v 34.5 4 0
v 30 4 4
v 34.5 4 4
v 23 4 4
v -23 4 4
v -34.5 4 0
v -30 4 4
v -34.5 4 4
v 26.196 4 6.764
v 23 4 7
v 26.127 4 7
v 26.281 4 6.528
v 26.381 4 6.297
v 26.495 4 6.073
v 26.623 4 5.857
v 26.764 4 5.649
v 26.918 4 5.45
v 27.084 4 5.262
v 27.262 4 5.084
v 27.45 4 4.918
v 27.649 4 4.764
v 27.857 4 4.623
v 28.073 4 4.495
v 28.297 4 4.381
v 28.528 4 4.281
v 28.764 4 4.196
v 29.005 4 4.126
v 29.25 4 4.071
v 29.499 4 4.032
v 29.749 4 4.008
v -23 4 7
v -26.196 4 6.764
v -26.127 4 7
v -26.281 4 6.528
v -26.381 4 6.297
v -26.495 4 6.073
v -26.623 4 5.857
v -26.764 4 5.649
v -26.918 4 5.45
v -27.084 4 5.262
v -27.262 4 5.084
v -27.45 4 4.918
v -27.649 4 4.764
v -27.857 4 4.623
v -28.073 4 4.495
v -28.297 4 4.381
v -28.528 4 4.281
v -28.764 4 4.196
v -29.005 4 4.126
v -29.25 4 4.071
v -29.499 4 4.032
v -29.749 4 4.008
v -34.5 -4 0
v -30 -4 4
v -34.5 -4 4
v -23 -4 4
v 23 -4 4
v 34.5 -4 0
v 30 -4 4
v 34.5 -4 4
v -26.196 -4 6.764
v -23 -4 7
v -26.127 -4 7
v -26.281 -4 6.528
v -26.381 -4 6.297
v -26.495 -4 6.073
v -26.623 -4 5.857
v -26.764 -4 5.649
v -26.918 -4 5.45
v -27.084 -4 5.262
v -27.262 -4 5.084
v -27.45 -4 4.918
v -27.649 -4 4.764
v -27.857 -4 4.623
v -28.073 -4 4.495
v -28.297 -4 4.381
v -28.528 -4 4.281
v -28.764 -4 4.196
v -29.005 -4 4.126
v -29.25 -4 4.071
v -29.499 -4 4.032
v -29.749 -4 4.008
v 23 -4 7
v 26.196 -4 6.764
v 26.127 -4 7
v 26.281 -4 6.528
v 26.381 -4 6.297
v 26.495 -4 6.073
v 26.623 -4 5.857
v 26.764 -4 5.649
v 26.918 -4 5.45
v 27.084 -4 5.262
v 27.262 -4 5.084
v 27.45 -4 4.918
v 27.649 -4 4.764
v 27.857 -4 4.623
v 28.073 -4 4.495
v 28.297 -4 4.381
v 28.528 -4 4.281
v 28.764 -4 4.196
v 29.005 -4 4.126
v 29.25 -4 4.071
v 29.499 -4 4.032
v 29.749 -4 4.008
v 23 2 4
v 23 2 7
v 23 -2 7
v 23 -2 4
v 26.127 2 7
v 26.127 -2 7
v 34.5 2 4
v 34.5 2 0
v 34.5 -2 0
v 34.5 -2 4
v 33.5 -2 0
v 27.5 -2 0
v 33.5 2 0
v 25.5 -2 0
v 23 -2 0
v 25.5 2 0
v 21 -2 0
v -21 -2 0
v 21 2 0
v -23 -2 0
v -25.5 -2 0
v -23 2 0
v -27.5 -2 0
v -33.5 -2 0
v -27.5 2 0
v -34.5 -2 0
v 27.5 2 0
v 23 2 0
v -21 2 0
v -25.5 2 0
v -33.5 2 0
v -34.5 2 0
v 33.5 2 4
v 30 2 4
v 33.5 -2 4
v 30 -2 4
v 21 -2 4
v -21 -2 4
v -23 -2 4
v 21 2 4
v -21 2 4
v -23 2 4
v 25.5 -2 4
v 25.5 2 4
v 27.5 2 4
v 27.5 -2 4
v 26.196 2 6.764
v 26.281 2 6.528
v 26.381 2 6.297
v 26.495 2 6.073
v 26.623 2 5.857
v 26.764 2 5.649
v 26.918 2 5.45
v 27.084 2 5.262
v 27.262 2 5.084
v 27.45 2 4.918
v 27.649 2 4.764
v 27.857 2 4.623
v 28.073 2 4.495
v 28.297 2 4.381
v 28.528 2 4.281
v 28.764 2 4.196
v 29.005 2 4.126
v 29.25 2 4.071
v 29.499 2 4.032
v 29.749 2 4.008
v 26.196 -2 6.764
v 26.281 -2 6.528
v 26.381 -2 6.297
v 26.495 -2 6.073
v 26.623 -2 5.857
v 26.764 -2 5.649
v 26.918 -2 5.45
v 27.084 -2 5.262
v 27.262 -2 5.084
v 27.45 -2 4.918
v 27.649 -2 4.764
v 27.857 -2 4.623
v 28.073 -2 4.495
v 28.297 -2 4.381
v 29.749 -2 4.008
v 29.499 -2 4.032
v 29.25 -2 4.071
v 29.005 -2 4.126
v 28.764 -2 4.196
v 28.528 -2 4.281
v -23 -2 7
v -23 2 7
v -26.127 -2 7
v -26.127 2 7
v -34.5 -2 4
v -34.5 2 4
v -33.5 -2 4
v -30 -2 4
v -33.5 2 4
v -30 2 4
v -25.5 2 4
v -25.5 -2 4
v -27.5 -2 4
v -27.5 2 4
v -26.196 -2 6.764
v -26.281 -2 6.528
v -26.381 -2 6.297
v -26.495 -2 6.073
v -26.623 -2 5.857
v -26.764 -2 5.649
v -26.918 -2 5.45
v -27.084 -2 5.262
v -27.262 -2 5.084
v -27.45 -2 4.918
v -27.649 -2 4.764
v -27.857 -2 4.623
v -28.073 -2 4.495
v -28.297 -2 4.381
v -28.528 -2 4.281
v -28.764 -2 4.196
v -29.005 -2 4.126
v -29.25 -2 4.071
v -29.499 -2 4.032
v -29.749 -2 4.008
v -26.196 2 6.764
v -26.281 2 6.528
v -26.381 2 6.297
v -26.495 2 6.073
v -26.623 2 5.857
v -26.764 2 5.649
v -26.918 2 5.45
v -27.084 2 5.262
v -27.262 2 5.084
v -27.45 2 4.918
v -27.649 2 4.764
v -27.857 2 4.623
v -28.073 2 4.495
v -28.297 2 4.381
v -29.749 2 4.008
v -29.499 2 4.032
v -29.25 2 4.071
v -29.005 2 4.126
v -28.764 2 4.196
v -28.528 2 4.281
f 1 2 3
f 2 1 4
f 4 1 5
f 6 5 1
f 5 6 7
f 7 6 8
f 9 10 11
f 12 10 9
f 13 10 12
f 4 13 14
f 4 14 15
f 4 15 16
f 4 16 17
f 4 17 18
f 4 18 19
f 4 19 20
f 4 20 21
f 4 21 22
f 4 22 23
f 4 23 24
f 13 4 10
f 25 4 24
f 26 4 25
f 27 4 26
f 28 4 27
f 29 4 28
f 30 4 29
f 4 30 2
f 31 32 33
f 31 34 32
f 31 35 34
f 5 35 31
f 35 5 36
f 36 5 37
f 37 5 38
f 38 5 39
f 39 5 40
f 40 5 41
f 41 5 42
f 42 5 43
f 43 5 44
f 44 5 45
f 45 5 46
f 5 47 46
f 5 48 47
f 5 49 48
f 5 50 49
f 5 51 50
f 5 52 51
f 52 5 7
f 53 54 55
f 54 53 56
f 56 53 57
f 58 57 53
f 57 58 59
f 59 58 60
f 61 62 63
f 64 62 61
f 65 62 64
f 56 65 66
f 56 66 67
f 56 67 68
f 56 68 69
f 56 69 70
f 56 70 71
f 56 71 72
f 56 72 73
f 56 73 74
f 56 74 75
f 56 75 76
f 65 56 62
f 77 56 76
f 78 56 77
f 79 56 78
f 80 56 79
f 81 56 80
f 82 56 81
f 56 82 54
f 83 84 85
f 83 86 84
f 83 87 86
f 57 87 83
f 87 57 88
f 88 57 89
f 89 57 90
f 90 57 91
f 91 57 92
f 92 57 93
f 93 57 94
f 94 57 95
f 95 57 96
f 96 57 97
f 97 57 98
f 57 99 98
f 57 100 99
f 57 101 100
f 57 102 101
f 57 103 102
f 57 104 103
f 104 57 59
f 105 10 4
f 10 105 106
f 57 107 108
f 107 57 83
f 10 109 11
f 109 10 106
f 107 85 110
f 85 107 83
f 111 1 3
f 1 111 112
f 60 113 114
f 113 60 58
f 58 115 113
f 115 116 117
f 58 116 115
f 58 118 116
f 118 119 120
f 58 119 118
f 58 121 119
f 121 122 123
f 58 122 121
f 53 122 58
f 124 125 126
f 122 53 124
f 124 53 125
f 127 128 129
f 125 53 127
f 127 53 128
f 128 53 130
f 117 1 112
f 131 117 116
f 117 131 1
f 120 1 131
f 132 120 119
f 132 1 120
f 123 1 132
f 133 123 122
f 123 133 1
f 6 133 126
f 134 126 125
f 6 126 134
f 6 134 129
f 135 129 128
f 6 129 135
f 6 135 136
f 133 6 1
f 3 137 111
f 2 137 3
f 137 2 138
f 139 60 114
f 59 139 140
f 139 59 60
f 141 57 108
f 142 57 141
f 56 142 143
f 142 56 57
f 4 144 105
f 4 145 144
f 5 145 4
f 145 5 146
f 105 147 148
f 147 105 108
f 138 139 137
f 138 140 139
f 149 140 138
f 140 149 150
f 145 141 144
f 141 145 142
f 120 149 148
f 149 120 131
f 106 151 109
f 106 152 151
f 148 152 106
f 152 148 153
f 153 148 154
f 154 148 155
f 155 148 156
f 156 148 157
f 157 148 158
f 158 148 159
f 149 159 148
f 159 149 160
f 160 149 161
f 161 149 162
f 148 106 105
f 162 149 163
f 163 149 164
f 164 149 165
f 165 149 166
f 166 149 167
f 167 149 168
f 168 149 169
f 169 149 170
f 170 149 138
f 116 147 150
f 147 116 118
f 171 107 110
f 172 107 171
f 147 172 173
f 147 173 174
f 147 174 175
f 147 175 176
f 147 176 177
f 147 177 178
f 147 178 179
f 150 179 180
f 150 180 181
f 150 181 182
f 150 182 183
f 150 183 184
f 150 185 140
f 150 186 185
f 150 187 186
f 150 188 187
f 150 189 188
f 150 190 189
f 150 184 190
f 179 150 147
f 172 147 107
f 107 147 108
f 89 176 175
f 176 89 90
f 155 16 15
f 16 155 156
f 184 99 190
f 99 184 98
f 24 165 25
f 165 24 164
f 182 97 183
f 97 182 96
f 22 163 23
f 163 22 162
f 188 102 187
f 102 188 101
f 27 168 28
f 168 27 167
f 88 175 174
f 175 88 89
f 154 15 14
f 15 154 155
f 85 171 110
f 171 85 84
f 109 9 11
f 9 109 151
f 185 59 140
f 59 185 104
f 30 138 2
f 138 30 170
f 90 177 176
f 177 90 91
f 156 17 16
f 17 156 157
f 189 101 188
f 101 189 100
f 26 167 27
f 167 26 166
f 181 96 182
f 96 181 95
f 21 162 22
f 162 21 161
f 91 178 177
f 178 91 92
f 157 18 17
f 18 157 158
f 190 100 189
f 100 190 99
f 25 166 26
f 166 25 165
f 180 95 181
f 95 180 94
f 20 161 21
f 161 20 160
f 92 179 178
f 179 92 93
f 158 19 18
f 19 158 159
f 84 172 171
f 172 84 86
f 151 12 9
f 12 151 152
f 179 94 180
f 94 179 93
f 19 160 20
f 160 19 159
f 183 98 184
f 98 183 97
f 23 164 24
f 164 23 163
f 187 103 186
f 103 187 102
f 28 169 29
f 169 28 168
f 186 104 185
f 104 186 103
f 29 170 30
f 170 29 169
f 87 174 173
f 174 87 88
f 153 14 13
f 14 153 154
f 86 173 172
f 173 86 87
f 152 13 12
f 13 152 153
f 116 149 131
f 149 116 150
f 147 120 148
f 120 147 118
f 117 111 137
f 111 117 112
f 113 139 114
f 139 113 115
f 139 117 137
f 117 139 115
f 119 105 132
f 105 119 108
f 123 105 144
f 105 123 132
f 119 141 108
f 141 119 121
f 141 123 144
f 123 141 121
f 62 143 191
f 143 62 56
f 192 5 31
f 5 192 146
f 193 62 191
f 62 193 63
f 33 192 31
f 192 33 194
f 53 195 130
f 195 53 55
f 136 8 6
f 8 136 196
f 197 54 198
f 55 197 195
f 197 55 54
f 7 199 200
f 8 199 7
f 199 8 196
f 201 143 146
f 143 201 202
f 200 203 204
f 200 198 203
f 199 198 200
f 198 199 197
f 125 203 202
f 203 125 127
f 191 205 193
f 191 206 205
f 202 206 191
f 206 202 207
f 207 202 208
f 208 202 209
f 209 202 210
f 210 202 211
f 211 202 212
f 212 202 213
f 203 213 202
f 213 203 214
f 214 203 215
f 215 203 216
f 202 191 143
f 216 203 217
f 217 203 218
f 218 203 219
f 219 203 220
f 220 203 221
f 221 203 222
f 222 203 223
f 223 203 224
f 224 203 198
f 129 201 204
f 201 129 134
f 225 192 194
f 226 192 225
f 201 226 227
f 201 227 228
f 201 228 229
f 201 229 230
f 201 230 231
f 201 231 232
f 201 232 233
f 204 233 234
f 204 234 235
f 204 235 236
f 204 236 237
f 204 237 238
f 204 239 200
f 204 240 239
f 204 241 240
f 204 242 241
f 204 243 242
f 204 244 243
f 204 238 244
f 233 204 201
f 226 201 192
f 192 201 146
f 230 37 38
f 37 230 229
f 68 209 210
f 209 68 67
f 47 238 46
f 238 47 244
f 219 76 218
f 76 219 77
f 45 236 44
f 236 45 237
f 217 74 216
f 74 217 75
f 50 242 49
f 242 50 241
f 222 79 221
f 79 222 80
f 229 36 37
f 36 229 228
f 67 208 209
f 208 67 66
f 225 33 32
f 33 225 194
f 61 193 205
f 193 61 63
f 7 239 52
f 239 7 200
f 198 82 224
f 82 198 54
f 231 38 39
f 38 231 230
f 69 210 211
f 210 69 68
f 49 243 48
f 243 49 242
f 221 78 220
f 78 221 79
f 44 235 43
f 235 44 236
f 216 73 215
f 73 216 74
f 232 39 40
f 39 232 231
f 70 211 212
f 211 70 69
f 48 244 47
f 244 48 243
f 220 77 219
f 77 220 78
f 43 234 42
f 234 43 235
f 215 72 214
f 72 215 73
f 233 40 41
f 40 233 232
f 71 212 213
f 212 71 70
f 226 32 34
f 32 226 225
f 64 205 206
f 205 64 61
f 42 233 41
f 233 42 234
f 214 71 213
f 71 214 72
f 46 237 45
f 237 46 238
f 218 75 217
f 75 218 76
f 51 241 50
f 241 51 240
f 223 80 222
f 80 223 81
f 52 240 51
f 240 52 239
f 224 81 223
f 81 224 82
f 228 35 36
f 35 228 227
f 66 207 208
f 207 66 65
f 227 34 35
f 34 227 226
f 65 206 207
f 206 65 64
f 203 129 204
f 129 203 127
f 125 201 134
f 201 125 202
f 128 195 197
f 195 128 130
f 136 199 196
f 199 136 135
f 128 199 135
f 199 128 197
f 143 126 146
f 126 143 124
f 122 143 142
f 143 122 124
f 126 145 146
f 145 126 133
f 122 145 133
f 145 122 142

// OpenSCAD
module printrmount() {

	// rod diameter & distance
	rod_hole = 8;
	rod_distance = 60;

	// mount holes for zipties distance
	mountdist = 52;
	zipperspacing = 8;
	zipperwidth = 4;
	zipperlength = 2;

	// extra holes
	mountdist2 = 43;


	width = zipperwidth *2;
	height = 4;
	flesh = 3;


	module halfmount() {

	difference() {

		difference() {
			
			union(){
				// rod hole block
				translate([rod_distance/2 - rod_hole/2 -flesh  , -rod_hole/2 - height/2 + 1  , -width/2])
				#cube([ rod_hole /2 + flesh  ,rod_hole /2 + height/2 - 1,width]);

				// base
				translate([0, -height/2, - width /2 ])
				cube([rod_distance/2 + rod_hole/2 + zipperlength/4 ,height,width]);
			}
			
			translate([0, -height*1.5, - zipperwidth /2 ])
			cube([rod_distance/2 + rod_hole/2 ,height,zipperwidth]);


		}
		
		

		// rod hole
		translate([rod_distance/2 , - rod_hole/2 -height/2   , -width])
		cylinder(r = rod_hole/2, h=width*2, $fn=100);

		//ziptie holes around rods
		translate([mountdist/2 - 1/2, -10, -zipperwidth/2])
		cube([zipperlength, 30,zipperwidth]);
		translate([mountdist/2- 1/2 +zipperspacing, -10, -zipperwidth/2])
		cube([zipperlength, 30,zipperwidth]);

		//extra ziptie holes for Sanguinololu board
		translate([mountdist2/2 - 1/2, -10, -zipperwidth/2])
		cube([zipperlength, 30,zipperwidth]);



	}

}	
	translate([0,0,height/2]) {
		rotate([-90,0,0]) {
			halfmount();
			rotate(180, [0, 1, 0])
			halfmount();
		}
	}

}

printrmount();
